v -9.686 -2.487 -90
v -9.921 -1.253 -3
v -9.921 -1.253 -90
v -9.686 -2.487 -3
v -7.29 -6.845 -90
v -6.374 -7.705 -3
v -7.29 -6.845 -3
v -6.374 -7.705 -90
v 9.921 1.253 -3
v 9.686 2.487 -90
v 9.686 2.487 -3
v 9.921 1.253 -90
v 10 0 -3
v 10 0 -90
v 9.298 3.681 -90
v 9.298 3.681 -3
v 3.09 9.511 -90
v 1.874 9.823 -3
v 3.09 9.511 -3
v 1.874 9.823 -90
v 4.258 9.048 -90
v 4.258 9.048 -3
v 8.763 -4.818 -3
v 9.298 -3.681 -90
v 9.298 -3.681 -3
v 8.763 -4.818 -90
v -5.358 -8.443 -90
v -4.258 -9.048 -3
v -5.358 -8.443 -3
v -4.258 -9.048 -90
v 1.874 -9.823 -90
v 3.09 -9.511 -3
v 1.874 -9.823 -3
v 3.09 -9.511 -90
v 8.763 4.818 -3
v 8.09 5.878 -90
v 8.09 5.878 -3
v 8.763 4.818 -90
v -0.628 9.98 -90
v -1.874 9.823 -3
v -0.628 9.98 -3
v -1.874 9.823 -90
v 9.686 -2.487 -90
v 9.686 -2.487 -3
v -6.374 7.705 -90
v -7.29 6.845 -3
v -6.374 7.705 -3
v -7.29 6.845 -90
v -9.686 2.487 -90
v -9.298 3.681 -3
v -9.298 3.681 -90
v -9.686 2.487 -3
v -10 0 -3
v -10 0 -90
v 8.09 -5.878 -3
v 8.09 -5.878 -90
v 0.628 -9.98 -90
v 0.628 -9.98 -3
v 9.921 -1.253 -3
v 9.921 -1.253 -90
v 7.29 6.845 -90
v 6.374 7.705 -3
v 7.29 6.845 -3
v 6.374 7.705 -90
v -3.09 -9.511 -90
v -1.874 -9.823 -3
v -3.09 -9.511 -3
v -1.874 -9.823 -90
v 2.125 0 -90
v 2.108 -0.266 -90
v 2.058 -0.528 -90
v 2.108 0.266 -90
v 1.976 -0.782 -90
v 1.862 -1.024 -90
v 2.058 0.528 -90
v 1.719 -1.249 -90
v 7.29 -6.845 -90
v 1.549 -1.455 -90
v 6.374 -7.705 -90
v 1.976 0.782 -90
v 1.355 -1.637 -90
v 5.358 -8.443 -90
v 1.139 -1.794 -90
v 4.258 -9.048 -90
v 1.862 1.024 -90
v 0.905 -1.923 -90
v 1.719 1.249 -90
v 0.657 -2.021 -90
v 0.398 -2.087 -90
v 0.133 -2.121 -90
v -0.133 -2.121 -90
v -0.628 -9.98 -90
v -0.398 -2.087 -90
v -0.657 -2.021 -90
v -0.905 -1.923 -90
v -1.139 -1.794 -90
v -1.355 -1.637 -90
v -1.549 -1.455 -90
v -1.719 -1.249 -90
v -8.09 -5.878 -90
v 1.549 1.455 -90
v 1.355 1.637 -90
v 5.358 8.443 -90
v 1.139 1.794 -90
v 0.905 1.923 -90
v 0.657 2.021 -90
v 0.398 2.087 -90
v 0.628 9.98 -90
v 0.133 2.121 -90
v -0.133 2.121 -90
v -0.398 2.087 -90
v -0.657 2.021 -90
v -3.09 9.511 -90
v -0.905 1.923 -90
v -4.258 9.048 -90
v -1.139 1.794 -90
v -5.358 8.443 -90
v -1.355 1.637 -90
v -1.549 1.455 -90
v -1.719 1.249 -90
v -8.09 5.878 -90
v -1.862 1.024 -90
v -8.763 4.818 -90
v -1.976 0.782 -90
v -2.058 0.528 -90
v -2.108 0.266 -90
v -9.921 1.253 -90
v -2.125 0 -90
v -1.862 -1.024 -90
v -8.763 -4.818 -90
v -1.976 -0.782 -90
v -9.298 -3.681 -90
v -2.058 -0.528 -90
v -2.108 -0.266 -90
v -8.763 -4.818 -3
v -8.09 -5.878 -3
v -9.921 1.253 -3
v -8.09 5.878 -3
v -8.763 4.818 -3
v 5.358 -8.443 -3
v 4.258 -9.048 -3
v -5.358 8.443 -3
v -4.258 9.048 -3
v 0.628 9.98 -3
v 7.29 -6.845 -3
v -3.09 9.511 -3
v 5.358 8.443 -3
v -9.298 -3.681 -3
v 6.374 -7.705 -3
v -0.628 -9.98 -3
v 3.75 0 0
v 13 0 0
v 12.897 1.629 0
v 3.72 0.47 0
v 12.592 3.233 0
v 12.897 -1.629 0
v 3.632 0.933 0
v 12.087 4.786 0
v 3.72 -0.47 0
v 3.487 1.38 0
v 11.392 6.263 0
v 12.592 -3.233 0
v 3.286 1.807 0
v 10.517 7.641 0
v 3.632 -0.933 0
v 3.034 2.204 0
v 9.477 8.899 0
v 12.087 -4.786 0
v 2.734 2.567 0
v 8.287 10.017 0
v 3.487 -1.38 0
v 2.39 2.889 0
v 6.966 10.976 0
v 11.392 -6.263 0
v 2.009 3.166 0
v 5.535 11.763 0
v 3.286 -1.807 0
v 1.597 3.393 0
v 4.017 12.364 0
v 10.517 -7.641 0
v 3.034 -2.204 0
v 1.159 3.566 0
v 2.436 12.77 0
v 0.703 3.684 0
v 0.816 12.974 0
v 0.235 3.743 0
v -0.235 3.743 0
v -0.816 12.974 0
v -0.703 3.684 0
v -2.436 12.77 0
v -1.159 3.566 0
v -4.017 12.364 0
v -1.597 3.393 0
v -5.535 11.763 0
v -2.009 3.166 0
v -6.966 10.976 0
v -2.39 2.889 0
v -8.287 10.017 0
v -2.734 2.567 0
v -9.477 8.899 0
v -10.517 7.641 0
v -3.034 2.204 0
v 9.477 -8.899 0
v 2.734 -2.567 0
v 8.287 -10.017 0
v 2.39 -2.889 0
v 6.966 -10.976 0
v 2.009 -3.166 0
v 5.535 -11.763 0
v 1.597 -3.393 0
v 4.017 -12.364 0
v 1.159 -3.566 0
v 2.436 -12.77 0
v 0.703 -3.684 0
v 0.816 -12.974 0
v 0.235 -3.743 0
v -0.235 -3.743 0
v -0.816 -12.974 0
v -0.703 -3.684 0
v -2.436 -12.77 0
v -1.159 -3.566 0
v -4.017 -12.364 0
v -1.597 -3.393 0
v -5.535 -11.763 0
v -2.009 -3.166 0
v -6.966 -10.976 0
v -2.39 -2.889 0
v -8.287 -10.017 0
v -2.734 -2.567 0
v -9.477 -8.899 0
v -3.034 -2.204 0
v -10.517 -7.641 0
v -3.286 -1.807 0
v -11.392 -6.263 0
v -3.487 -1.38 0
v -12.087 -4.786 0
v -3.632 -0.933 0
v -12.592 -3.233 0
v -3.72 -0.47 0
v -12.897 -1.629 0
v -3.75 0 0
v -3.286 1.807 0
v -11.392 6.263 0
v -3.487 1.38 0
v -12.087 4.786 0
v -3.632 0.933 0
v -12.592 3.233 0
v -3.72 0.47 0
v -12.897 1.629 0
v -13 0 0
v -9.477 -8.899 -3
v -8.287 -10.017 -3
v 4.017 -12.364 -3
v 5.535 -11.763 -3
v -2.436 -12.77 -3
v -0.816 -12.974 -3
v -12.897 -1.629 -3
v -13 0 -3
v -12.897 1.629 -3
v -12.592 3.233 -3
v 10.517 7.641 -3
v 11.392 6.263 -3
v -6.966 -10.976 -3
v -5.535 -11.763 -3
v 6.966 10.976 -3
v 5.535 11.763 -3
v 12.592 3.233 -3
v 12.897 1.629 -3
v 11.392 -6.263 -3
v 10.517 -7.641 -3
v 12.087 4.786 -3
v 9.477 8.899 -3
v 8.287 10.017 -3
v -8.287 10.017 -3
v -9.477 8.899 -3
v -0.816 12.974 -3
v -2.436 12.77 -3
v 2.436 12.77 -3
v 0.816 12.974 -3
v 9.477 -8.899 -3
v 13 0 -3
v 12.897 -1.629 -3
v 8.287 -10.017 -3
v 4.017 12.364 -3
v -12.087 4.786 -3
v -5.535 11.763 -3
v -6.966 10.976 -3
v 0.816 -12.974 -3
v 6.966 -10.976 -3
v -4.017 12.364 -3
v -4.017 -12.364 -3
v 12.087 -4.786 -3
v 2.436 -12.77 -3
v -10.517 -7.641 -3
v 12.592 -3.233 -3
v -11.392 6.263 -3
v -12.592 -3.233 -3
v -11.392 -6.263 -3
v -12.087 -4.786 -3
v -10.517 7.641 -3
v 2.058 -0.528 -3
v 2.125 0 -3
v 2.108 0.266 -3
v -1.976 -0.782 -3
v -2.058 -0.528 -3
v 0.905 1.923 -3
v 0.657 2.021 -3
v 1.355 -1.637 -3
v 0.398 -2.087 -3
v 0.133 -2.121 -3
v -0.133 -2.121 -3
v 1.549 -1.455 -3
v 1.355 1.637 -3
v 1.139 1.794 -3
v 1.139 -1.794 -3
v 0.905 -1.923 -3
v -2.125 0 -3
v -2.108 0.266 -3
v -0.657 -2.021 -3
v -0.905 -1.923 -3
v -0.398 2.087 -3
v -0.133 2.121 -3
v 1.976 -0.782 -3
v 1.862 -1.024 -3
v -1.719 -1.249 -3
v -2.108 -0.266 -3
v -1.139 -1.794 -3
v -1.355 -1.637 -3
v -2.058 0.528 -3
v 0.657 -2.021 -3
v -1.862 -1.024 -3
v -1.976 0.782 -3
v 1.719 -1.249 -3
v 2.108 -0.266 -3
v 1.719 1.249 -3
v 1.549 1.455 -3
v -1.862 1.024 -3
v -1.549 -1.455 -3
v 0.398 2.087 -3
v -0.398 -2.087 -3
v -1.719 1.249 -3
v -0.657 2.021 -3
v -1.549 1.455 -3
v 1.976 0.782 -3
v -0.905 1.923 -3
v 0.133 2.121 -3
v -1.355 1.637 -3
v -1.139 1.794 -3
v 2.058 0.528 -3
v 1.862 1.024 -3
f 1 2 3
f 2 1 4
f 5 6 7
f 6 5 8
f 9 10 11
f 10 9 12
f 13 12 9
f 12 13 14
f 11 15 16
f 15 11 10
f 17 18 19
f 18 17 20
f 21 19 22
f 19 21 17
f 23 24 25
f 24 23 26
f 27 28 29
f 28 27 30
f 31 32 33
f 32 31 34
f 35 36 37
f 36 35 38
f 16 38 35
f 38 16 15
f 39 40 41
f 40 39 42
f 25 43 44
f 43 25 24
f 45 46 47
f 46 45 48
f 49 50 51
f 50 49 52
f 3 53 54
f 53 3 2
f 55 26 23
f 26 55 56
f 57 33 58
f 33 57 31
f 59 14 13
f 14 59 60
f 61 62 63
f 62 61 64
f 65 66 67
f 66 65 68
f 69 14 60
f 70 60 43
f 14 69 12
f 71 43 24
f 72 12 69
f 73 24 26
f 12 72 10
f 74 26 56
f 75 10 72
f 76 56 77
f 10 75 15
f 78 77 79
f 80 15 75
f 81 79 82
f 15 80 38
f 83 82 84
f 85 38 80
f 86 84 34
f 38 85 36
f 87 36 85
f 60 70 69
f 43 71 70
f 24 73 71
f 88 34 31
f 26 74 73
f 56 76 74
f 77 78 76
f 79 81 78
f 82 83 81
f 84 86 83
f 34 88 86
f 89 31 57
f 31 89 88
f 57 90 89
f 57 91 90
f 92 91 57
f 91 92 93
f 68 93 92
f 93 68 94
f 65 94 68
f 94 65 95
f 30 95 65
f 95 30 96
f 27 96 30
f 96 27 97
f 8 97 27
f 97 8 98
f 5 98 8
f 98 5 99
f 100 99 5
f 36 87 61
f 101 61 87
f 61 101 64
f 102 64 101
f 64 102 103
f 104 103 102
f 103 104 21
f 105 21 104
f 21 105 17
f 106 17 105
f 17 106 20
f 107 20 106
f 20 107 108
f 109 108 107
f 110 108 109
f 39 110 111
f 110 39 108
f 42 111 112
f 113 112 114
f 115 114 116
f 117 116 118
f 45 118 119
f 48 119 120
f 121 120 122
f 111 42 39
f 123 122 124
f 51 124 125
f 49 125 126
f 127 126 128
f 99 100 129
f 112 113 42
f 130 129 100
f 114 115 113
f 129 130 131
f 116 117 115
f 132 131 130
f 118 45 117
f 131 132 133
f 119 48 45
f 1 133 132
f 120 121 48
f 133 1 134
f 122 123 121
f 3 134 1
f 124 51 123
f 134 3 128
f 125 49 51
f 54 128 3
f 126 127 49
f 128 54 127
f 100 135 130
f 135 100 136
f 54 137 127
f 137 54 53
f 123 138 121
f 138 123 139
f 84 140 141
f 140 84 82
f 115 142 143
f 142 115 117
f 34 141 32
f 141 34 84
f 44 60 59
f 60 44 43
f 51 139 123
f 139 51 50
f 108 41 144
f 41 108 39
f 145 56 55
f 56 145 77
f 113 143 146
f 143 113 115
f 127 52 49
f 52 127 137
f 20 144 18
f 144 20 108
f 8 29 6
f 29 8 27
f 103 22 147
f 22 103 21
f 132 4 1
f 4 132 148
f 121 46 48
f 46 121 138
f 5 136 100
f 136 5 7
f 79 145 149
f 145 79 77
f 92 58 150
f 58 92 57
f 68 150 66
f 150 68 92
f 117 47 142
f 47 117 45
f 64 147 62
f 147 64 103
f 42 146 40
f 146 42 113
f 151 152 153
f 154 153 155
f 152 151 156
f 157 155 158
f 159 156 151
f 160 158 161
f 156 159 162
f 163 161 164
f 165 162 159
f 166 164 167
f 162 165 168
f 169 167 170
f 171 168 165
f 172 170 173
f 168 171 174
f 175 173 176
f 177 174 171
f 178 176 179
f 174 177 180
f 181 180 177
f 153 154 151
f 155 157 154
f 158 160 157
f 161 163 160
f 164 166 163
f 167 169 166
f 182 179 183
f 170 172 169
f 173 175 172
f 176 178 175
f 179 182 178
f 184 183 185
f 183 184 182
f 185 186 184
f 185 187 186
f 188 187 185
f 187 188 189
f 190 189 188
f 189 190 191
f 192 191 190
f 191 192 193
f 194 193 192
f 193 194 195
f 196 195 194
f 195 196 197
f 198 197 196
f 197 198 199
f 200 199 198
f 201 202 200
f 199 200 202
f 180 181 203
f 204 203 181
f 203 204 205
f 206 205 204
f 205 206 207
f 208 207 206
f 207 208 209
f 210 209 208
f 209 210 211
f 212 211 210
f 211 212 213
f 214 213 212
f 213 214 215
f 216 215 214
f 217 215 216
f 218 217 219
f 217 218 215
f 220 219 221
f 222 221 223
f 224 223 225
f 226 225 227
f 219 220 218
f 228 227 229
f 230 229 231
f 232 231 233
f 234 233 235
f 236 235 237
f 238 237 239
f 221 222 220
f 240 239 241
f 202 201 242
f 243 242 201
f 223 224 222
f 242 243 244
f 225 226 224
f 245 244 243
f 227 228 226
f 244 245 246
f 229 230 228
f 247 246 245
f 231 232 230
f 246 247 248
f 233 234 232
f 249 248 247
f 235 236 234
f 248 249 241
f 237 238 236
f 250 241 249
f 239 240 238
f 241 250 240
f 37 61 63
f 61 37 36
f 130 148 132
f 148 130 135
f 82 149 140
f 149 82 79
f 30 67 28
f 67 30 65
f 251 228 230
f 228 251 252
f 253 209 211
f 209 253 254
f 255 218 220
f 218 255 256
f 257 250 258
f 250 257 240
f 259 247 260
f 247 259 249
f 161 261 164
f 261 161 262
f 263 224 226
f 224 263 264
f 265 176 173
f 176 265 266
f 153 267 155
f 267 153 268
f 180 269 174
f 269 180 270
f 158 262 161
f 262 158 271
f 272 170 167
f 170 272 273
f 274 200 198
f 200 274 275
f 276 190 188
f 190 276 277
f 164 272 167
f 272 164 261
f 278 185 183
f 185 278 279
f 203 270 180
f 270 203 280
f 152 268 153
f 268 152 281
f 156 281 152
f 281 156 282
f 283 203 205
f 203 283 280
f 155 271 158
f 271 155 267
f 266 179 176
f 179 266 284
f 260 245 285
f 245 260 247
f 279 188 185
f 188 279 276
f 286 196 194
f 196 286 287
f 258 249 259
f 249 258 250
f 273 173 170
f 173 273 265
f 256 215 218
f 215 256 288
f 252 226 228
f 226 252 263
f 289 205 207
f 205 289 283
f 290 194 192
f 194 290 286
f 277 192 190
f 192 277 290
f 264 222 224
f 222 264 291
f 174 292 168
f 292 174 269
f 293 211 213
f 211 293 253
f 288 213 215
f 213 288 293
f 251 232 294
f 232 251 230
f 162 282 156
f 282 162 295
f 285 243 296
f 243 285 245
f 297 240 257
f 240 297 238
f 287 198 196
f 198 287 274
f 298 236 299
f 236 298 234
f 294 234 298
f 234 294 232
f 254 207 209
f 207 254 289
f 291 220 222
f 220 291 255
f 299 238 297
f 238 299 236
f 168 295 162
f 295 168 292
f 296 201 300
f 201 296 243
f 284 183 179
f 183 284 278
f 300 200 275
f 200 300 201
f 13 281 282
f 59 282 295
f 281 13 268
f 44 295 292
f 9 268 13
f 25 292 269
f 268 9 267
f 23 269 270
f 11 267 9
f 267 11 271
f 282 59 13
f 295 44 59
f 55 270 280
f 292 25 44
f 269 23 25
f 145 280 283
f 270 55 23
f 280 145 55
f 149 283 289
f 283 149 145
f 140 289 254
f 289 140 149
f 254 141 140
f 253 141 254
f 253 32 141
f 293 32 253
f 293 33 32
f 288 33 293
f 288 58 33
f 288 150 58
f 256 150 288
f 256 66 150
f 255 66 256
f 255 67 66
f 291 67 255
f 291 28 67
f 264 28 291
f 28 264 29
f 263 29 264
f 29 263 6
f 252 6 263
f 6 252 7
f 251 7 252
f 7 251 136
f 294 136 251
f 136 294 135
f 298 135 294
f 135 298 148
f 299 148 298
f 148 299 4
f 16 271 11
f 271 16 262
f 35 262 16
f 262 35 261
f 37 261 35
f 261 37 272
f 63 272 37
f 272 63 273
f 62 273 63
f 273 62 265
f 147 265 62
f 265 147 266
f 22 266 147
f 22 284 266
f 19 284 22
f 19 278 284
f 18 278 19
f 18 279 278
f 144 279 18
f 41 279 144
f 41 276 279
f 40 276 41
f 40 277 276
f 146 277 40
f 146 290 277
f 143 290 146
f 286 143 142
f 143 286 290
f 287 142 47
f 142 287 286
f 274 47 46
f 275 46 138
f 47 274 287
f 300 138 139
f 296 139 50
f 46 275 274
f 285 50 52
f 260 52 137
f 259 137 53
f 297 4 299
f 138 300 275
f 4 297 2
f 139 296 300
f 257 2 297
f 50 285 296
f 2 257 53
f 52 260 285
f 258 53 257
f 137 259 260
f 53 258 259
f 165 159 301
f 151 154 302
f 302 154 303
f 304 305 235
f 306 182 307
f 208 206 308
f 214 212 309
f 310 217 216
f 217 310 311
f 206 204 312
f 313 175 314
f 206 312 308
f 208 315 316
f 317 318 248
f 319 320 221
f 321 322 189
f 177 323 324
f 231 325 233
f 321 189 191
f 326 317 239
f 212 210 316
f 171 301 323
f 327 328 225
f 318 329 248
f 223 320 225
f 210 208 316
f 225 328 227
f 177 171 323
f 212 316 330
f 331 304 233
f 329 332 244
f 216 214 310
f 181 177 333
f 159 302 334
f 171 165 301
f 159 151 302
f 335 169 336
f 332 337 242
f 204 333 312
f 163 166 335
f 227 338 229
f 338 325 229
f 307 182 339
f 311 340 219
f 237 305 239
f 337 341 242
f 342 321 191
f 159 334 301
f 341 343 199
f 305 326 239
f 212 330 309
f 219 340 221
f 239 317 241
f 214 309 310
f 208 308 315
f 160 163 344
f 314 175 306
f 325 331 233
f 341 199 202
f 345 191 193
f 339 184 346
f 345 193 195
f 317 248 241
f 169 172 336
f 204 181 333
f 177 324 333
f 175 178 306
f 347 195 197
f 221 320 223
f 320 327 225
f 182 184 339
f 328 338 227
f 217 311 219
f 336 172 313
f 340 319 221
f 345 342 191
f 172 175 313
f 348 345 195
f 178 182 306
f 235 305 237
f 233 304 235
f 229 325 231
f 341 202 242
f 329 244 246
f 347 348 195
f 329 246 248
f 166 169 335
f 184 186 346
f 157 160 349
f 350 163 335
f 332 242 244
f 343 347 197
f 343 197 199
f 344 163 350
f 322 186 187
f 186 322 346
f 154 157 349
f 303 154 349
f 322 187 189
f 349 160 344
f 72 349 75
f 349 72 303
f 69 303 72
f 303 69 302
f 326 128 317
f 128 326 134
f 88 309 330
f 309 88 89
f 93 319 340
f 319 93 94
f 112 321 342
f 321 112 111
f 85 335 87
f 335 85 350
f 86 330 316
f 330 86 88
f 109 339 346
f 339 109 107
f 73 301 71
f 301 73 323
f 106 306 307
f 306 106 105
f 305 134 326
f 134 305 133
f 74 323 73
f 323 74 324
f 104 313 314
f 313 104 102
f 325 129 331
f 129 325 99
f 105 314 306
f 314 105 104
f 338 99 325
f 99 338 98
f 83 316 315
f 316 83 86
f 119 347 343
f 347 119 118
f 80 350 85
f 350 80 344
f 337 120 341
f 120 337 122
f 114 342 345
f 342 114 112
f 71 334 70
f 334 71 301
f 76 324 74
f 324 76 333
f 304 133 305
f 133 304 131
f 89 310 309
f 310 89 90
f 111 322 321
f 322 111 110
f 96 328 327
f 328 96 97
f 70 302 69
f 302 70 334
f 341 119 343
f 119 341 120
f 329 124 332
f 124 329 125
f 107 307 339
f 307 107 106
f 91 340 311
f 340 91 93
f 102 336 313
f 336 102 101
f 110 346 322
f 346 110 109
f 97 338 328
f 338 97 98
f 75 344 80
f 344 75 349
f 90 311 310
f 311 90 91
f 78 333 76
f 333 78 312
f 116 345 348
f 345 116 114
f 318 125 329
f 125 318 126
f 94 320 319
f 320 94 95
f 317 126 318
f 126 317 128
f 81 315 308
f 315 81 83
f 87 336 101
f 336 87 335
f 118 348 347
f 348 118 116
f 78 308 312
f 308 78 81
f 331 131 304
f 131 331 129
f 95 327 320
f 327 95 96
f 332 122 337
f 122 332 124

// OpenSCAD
$fn = 50;


difference() {
	union() {
		translate(v = [0, 0, -90.0000000000]) {
			cylinder(h = 90, r = 10.0000000000);
		}
		translate(v = [0, 0, -3.0000000000]) {
			cylinder(h = 3, r = 13.0000000000);
		}
	}
	union() {
		translate(v = [0, 0, 0]) {
			rotate(a = [0, 0, 0]) {
				difference() {
					union() {
						#translate(v = [0, 0, -90.0000000000]) {
							cylinder(h = 90, r = 2.0000000000);
						}
						#translate(v = [0, 0, -3]) {
							cylinder(h = 3, r = 10.0000000000, r1 = 2.1250000000, r2 = 3.7500000000);
						}
						#translate(v = [0, 0, -90.0000000000]) {
							cylinder(h = 90, r = 2.1250000000);
						}
						#translate(v = [0, 0, -90.0000000000]) {
							cylinder(h = 90, r = 2.0000000000);
						}
					}
					union();
				}
			}
		}
	}
}
